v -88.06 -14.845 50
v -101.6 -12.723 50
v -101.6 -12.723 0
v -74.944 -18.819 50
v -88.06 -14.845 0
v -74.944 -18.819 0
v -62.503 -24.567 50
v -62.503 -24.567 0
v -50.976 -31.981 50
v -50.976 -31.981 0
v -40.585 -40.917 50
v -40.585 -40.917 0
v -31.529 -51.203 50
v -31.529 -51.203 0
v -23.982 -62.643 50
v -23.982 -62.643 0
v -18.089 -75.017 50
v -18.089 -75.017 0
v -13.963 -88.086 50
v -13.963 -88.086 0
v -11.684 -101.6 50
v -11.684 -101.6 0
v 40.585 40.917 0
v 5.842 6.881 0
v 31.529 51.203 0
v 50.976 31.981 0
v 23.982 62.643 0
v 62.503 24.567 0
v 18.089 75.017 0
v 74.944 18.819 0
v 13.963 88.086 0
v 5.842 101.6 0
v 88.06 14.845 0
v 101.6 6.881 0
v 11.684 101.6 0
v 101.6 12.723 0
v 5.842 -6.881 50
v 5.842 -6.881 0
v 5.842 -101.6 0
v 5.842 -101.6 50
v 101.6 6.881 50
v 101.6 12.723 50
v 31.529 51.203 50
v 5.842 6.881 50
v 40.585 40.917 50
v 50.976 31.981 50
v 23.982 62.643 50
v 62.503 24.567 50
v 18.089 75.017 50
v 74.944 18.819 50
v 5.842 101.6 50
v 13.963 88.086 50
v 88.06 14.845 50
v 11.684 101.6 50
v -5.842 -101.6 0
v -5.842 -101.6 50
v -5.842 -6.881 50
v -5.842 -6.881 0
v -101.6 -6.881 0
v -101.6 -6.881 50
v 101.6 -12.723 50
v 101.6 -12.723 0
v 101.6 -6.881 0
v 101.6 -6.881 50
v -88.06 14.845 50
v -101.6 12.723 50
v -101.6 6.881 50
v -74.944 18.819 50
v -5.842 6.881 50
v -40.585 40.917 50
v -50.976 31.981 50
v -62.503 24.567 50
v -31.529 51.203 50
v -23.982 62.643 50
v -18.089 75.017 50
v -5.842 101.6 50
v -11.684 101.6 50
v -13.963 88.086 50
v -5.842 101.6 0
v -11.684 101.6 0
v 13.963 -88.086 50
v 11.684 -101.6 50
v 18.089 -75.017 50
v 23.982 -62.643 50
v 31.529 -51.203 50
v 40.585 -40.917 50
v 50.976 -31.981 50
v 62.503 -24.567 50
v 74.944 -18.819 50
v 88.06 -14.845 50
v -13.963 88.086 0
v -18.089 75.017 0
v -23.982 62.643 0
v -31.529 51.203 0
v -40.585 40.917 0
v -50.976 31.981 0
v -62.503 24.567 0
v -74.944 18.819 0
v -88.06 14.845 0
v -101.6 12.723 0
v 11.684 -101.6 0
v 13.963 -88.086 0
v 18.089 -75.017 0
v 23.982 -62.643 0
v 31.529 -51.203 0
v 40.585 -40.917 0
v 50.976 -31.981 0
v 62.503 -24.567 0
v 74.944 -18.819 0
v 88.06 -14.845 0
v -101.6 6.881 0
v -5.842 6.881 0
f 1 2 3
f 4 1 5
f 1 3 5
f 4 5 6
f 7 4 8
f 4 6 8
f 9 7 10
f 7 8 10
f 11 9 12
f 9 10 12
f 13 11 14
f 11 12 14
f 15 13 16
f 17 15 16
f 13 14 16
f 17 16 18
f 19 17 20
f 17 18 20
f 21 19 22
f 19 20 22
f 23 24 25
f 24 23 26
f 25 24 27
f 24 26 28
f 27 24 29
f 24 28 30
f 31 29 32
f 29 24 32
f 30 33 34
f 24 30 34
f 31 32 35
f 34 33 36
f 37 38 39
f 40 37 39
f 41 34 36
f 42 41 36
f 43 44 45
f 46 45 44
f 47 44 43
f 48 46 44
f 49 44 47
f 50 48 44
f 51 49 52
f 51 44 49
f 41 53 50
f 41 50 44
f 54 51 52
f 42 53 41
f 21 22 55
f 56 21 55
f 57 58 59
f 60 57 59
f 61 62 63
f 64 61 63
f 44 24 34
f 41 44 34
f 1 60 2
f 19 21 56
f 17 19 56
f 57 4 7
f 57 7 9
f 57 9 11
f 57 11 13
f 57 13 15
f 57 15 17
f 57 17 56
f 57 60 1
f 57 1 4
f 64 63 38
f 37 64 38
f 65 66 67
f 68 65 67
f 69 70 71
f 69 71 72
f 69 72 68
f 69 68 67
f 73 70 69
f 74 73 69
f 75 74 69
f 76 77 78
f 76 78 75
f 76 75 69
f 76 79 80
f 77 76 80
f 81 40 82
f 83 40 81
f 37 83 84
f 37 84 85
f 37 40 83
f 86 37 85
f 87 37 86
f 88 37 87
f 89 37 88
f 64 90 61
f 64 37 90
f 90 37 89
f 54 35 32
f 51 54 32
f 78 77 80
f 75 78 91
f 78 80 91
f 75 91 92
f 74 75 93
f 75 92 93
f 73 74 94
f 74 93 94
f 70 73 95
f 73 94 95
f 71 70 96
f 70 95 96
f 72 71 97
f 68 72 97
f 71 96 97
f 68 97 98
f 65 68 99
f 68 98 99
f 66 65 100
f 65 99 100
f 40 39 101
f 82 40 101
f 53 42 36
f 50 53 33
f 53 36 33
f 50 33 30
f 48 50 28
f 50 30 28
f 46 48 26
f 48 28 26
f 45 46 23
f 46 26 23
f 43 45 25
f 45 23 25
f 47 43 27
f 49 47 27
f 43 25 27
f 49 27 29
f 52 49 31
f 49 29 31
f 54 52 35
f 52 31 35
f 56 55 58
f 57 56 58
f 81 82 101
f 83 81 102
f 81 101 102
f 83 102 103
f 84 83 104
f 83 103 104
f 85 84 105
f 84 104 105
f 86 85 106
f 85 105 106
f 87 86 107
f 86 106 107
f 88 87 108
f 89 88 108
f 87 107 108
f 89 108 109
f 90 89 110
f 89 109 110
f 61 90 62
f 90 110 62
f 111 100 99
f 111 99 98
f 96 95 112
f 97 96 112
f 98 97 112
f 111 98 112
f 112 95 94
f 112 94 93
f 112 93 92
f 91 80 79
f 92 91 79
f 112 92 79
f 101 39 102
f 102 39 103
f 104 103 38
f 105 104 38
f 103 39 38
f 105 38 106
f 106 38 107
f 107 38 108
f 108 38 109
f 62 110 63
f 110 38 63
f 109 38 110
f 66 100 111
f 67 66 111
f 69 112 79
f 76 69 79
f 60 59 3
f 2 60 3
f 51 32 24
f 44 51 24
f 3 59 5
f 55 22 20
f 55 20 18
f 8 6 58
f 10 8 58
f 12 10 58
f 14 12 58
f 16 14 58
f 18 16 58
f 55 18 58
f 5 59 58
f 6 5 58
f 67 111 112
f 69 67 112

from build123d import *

# Parameters (mm, degrees)
F1_DEPTH = 50


with BuildPart() as f1:
    # F0 (on Top) → F1 (new body)
    with BuildSketch(Plane.XY):
        with BuildLine():
            Line((-5.842, -101.6), (-5.842, -6.880943))
            Line((-5.842, -6.880943), (-101.6, -6.880943))
            Line((-101.6, -6.880943), (-101.6, -12.722943))
            ThreePointArc((-101.6, -12.722943), (-40.585001, -40.916772), (-11.684, -101.6))
            Line((-11.684, -101.6), (-5.842, -101.6))
        make_face()
        with BuildLine():
            Line((-101.6, 6.880943), (-5.842, 6.880943))
            Line((-5.842, 6.880943), (-5.842, 101.6))
            Line((-5.842, 101.6), (-11.684, 101.6))
            ThreePointArc((-11.684, 101.6), (-40.585001, 40.916772), (-101.6, 12.722943))
            Line((-101.6, 12.722943), (-101.6, 6.880943))
        make_face()
        with BuildLine():
            Line((5.842, 101.6), (5.842, 6.880943))
            Line((5.842, 6.880943), (101.6, 6.880943))
            Line((101.6, 6.880943), (101.6, 12.722943))
            ThreePointArc((101.6, 12.722943), (40.585001, 40.916772), (11.684, 101.6))
            Line((11.684, 101.6), (5.842, 101.6))
        make_face()
        with BuildLine():
            Line((101.6, -6.880943), (5.842, -6.880943))
            Line((5.842, -6.880943), (5.842, -101.6))
            Line((5.842, -101.6), (11.684, -101.6))
            ThreePointArc((11.684, -101.6), (40.585001, -40.916772), (101.6, -12.722943))
            Line((101.6, -12.722943), (101.6, -6.880943))
        make_face()
    extrude(amount=F1_DEPTH)


solid = f1.part
